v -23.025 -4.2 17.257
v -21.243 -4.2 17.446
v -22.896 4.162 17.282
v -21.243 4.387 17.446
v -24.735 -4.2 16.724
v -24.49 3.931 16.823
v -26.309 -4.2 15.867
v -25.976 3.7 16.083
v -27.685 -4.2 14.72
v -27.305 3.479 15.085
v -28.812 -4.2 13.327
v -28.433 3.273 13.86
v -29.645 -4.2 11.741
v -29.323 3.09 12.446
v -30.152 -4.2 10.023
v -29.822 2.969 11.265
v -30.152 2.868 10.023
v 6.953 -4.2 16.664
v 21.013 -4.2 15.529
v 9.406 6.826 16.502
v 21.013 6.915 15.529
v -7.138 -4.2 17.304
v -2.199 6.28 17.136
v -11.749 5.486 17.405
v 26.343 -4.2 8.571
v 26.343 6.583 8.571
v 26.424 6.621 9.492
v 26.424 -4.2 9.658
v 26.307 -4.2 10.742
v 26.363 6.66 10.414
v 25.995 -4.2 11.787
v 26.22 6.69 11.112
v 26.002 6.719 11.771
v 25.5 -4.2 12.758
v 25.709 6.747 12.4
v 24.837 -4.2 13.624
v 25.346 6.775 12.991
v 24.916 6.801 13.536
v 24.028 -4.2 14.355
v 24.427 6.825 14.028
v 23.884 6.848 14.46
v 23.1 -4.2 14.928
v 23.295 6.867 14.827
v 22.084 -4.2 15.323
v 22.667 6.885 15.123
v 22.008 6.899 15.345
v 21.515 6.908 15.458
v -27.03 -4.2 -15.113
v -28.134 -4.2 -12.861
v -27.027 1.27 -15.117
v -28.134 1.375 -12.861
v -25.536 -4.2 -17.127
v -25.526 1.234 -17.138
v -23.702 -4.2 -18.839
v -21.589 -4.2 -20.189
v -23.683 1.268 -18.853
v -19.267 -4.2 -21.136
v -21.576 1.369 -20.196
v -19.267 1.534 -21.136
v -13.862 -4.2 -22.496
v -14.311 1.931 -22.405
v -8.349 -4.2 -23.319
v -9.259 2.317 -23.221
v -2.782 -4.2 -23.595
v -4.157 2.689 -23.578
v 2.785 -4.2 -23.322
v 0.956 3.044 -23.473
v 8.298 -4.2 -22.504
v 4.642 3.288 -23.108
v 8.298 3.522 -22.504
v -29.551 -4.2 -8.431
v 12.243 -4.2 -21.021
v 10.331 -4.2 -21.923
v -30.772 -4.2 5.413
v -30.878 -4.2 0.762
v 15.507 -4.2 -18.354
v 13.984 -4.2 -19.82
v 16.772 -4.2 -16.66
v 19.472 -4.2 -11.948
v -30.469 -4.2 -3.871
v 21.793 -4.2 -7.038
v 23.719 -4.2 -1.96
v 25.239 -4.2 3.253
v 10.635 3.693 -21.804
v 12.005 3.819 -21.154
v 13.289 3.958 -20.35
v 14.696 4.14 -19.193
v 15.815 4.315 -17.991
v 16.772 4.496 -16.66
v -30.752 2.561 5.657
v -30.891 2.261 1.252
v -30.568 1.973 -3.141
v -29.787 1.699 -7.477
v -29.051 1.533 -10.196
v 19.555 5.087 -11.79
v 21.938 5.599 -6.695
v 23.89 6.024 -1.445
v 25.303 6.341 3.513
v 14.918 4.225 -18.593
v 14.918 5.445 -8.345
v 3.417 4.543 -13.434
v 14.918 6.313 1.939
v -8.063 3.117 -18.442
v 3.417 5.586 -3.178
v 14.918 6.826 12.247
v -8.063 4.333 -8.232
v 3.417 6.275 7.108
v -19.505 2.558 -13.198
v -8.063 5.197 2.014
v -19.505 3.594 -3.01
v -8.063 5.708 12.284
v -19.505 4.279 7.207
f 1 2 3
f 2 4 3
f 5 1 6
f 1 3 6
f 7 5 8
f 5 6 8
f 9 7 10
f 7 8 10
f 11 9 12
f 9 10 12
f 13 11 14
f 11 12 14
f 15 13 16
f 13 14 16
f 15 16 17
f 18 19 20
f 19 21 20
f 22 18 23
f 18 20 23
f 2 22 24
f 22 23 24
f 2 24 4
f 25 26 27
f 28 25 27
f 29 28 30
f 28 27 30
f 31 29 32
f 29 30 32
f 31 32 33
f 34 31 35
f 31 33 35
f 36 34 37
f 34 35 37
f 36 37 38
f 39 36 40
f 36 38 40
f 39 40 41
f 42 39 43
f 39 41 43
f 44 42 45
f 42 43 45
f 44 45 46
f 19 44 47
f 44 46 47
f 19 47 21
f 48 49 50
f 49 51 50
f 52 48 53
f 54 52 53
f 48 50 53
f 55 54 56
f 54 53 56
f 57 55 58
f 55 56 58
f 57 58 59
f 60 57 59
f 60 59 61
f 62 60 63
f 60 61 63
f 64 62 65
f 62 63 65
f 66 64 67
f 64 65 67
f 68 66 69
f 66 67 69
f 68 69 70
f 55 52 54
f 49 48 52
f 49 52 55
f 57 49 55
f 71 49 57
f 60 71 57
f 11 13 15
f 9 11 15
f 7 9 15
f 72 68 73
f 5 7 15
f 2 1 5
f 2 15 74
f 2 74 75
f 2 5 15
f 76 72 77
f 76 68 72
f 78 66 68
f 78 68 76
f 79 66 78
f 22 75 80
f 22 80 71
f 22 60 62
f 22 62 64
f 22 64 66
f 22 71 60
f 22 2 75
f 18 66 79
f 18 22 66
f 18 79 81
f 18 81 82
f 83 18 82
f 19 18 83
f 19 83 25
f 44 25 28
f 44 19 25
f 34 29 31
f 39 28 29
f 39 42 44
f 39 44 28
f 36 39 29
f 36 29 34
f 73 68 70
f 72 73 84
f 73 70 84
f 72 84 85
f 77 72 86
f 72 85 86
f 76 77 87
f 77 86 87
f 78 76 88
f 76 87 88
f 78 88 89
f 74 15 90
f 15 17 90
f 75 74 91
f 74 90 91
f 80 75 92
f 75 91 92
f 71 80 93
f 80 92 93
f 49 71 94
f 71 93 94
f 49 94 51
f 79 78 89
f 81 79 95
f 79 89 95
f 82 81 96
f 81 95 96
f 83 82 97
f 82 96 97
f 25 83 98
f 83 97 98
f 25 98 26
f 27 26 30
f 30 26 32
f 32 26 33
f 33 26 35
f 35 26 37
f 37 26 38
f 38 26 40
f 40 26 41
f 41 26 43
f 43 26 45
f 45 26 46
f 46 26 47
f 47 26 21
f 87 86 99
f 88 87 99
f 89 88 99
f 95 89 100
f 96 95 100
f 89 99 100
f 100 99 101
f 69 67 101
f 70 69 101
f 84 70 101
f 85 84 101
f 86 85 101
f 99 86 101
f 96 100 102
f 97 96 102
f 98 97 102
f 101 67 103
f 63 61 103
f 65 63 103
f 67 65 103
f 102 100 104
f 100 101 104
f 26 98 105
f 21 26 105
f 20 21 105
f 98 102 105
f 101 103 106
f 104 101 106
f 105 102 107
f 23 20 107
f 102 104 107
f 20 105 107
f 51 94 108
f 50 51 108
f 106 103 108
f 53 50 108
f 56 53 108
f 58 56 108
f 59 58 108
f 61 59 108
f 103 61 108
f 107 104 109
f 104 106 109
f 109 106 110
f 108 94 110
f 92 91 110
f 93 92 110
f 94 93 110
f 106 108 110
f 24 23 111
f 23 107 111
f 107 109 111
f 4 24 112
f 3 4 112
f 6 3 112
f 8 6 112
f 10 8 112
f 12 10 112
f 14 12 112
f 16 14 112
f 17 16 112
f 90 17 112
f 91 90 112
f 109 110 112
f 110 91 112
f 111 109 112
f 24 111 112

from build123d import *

# Parameters (mm, degrees)
F1_DEPTH      = 25
F4_ANGLE_BACK = 15
F4_ANGLE      = 30
F6_DEPTH      = 4.2


with BuildPart() as f1:
    # F0 (on Front) → F1 (new body)
    with BuildSketch(Plane.XZ):
        with BuildLine():
            ThreePointArc((26.3431364877, 8.5707053028), (25.1879544986, 13.2060879092), (21.0133194591, 15.5285089783))
            ThreePointArc((21.0133194591, 15.5285089783), (-0.0894086287, 17.0460813995), (-21.2428583947, 17.4457334904))
            ThreePointArc((-21.2428583947, 17.4457334904), (-27.0252643869, 15.3277245971), (-30.1521339791, 10.0225509634))
            ThreePointArc((-30.1521339791, 10.0225509634), (-30.737948683, -1.5598670025), (-28.1338702514, -12.8609448416))
            ThreePointArc((-28.1338702514, -12.8609448416), (-24.6579753008, -18.0246958087), (-19.2665178824, -21.1357015406))
            ThreePointArc((-19.2665178824, -21.1357015406), (-5.5690318774, -23.5254263951), (8.2977543738, -22.503591381))
            ThreePointArc((8.2977543738, -22.503591381), (13.1377213939, -20.4559972218), (16.7715565718, -16.6595298512))
            ThreePointArc((16.7715565718, -16.6595298512), (22.8064529235, -4.5182850542), (26.3431364877, 8.5707053028))
        make_face()
    extrude(amount=-F1_DEPTH)


with BuildPart() as f4:
    # F3 (on offset) → F4 (revolve)
    with BuildSketch(Plane.XY.offset(22), mode=Mode.PRIVATE) as f4_sk:
        with BuildLine():
            Line((-282, -293), (318, -293))
            ThreePointArc((318, -293), (18, 7), (-282, -293))
        make_face()
    revolve(f4_sk.sketch.rotate(Axis((18, -293, 22), (1, 0, 0)), -F4_ANGLE_BACK), axis=Axis((18, -293, 22), (1, 0, 0)), revolution_arc=F4_ANGLE)


with BuildPart() as f1_1:
    add(f1.part)

    # F5: intersect F4
    add(f4.part, mode=Mode.INTERSECT)

    # F6 (add): a face of the model
    f6_faces = [f1_1.faces().sort_by_distance(p)[0] for p in [
        (-3.417701973, 0, -1.7255808381),
    ]]
    extrude(f6_faces, amount=F6_DEPTH)


solid = f1_1.part
